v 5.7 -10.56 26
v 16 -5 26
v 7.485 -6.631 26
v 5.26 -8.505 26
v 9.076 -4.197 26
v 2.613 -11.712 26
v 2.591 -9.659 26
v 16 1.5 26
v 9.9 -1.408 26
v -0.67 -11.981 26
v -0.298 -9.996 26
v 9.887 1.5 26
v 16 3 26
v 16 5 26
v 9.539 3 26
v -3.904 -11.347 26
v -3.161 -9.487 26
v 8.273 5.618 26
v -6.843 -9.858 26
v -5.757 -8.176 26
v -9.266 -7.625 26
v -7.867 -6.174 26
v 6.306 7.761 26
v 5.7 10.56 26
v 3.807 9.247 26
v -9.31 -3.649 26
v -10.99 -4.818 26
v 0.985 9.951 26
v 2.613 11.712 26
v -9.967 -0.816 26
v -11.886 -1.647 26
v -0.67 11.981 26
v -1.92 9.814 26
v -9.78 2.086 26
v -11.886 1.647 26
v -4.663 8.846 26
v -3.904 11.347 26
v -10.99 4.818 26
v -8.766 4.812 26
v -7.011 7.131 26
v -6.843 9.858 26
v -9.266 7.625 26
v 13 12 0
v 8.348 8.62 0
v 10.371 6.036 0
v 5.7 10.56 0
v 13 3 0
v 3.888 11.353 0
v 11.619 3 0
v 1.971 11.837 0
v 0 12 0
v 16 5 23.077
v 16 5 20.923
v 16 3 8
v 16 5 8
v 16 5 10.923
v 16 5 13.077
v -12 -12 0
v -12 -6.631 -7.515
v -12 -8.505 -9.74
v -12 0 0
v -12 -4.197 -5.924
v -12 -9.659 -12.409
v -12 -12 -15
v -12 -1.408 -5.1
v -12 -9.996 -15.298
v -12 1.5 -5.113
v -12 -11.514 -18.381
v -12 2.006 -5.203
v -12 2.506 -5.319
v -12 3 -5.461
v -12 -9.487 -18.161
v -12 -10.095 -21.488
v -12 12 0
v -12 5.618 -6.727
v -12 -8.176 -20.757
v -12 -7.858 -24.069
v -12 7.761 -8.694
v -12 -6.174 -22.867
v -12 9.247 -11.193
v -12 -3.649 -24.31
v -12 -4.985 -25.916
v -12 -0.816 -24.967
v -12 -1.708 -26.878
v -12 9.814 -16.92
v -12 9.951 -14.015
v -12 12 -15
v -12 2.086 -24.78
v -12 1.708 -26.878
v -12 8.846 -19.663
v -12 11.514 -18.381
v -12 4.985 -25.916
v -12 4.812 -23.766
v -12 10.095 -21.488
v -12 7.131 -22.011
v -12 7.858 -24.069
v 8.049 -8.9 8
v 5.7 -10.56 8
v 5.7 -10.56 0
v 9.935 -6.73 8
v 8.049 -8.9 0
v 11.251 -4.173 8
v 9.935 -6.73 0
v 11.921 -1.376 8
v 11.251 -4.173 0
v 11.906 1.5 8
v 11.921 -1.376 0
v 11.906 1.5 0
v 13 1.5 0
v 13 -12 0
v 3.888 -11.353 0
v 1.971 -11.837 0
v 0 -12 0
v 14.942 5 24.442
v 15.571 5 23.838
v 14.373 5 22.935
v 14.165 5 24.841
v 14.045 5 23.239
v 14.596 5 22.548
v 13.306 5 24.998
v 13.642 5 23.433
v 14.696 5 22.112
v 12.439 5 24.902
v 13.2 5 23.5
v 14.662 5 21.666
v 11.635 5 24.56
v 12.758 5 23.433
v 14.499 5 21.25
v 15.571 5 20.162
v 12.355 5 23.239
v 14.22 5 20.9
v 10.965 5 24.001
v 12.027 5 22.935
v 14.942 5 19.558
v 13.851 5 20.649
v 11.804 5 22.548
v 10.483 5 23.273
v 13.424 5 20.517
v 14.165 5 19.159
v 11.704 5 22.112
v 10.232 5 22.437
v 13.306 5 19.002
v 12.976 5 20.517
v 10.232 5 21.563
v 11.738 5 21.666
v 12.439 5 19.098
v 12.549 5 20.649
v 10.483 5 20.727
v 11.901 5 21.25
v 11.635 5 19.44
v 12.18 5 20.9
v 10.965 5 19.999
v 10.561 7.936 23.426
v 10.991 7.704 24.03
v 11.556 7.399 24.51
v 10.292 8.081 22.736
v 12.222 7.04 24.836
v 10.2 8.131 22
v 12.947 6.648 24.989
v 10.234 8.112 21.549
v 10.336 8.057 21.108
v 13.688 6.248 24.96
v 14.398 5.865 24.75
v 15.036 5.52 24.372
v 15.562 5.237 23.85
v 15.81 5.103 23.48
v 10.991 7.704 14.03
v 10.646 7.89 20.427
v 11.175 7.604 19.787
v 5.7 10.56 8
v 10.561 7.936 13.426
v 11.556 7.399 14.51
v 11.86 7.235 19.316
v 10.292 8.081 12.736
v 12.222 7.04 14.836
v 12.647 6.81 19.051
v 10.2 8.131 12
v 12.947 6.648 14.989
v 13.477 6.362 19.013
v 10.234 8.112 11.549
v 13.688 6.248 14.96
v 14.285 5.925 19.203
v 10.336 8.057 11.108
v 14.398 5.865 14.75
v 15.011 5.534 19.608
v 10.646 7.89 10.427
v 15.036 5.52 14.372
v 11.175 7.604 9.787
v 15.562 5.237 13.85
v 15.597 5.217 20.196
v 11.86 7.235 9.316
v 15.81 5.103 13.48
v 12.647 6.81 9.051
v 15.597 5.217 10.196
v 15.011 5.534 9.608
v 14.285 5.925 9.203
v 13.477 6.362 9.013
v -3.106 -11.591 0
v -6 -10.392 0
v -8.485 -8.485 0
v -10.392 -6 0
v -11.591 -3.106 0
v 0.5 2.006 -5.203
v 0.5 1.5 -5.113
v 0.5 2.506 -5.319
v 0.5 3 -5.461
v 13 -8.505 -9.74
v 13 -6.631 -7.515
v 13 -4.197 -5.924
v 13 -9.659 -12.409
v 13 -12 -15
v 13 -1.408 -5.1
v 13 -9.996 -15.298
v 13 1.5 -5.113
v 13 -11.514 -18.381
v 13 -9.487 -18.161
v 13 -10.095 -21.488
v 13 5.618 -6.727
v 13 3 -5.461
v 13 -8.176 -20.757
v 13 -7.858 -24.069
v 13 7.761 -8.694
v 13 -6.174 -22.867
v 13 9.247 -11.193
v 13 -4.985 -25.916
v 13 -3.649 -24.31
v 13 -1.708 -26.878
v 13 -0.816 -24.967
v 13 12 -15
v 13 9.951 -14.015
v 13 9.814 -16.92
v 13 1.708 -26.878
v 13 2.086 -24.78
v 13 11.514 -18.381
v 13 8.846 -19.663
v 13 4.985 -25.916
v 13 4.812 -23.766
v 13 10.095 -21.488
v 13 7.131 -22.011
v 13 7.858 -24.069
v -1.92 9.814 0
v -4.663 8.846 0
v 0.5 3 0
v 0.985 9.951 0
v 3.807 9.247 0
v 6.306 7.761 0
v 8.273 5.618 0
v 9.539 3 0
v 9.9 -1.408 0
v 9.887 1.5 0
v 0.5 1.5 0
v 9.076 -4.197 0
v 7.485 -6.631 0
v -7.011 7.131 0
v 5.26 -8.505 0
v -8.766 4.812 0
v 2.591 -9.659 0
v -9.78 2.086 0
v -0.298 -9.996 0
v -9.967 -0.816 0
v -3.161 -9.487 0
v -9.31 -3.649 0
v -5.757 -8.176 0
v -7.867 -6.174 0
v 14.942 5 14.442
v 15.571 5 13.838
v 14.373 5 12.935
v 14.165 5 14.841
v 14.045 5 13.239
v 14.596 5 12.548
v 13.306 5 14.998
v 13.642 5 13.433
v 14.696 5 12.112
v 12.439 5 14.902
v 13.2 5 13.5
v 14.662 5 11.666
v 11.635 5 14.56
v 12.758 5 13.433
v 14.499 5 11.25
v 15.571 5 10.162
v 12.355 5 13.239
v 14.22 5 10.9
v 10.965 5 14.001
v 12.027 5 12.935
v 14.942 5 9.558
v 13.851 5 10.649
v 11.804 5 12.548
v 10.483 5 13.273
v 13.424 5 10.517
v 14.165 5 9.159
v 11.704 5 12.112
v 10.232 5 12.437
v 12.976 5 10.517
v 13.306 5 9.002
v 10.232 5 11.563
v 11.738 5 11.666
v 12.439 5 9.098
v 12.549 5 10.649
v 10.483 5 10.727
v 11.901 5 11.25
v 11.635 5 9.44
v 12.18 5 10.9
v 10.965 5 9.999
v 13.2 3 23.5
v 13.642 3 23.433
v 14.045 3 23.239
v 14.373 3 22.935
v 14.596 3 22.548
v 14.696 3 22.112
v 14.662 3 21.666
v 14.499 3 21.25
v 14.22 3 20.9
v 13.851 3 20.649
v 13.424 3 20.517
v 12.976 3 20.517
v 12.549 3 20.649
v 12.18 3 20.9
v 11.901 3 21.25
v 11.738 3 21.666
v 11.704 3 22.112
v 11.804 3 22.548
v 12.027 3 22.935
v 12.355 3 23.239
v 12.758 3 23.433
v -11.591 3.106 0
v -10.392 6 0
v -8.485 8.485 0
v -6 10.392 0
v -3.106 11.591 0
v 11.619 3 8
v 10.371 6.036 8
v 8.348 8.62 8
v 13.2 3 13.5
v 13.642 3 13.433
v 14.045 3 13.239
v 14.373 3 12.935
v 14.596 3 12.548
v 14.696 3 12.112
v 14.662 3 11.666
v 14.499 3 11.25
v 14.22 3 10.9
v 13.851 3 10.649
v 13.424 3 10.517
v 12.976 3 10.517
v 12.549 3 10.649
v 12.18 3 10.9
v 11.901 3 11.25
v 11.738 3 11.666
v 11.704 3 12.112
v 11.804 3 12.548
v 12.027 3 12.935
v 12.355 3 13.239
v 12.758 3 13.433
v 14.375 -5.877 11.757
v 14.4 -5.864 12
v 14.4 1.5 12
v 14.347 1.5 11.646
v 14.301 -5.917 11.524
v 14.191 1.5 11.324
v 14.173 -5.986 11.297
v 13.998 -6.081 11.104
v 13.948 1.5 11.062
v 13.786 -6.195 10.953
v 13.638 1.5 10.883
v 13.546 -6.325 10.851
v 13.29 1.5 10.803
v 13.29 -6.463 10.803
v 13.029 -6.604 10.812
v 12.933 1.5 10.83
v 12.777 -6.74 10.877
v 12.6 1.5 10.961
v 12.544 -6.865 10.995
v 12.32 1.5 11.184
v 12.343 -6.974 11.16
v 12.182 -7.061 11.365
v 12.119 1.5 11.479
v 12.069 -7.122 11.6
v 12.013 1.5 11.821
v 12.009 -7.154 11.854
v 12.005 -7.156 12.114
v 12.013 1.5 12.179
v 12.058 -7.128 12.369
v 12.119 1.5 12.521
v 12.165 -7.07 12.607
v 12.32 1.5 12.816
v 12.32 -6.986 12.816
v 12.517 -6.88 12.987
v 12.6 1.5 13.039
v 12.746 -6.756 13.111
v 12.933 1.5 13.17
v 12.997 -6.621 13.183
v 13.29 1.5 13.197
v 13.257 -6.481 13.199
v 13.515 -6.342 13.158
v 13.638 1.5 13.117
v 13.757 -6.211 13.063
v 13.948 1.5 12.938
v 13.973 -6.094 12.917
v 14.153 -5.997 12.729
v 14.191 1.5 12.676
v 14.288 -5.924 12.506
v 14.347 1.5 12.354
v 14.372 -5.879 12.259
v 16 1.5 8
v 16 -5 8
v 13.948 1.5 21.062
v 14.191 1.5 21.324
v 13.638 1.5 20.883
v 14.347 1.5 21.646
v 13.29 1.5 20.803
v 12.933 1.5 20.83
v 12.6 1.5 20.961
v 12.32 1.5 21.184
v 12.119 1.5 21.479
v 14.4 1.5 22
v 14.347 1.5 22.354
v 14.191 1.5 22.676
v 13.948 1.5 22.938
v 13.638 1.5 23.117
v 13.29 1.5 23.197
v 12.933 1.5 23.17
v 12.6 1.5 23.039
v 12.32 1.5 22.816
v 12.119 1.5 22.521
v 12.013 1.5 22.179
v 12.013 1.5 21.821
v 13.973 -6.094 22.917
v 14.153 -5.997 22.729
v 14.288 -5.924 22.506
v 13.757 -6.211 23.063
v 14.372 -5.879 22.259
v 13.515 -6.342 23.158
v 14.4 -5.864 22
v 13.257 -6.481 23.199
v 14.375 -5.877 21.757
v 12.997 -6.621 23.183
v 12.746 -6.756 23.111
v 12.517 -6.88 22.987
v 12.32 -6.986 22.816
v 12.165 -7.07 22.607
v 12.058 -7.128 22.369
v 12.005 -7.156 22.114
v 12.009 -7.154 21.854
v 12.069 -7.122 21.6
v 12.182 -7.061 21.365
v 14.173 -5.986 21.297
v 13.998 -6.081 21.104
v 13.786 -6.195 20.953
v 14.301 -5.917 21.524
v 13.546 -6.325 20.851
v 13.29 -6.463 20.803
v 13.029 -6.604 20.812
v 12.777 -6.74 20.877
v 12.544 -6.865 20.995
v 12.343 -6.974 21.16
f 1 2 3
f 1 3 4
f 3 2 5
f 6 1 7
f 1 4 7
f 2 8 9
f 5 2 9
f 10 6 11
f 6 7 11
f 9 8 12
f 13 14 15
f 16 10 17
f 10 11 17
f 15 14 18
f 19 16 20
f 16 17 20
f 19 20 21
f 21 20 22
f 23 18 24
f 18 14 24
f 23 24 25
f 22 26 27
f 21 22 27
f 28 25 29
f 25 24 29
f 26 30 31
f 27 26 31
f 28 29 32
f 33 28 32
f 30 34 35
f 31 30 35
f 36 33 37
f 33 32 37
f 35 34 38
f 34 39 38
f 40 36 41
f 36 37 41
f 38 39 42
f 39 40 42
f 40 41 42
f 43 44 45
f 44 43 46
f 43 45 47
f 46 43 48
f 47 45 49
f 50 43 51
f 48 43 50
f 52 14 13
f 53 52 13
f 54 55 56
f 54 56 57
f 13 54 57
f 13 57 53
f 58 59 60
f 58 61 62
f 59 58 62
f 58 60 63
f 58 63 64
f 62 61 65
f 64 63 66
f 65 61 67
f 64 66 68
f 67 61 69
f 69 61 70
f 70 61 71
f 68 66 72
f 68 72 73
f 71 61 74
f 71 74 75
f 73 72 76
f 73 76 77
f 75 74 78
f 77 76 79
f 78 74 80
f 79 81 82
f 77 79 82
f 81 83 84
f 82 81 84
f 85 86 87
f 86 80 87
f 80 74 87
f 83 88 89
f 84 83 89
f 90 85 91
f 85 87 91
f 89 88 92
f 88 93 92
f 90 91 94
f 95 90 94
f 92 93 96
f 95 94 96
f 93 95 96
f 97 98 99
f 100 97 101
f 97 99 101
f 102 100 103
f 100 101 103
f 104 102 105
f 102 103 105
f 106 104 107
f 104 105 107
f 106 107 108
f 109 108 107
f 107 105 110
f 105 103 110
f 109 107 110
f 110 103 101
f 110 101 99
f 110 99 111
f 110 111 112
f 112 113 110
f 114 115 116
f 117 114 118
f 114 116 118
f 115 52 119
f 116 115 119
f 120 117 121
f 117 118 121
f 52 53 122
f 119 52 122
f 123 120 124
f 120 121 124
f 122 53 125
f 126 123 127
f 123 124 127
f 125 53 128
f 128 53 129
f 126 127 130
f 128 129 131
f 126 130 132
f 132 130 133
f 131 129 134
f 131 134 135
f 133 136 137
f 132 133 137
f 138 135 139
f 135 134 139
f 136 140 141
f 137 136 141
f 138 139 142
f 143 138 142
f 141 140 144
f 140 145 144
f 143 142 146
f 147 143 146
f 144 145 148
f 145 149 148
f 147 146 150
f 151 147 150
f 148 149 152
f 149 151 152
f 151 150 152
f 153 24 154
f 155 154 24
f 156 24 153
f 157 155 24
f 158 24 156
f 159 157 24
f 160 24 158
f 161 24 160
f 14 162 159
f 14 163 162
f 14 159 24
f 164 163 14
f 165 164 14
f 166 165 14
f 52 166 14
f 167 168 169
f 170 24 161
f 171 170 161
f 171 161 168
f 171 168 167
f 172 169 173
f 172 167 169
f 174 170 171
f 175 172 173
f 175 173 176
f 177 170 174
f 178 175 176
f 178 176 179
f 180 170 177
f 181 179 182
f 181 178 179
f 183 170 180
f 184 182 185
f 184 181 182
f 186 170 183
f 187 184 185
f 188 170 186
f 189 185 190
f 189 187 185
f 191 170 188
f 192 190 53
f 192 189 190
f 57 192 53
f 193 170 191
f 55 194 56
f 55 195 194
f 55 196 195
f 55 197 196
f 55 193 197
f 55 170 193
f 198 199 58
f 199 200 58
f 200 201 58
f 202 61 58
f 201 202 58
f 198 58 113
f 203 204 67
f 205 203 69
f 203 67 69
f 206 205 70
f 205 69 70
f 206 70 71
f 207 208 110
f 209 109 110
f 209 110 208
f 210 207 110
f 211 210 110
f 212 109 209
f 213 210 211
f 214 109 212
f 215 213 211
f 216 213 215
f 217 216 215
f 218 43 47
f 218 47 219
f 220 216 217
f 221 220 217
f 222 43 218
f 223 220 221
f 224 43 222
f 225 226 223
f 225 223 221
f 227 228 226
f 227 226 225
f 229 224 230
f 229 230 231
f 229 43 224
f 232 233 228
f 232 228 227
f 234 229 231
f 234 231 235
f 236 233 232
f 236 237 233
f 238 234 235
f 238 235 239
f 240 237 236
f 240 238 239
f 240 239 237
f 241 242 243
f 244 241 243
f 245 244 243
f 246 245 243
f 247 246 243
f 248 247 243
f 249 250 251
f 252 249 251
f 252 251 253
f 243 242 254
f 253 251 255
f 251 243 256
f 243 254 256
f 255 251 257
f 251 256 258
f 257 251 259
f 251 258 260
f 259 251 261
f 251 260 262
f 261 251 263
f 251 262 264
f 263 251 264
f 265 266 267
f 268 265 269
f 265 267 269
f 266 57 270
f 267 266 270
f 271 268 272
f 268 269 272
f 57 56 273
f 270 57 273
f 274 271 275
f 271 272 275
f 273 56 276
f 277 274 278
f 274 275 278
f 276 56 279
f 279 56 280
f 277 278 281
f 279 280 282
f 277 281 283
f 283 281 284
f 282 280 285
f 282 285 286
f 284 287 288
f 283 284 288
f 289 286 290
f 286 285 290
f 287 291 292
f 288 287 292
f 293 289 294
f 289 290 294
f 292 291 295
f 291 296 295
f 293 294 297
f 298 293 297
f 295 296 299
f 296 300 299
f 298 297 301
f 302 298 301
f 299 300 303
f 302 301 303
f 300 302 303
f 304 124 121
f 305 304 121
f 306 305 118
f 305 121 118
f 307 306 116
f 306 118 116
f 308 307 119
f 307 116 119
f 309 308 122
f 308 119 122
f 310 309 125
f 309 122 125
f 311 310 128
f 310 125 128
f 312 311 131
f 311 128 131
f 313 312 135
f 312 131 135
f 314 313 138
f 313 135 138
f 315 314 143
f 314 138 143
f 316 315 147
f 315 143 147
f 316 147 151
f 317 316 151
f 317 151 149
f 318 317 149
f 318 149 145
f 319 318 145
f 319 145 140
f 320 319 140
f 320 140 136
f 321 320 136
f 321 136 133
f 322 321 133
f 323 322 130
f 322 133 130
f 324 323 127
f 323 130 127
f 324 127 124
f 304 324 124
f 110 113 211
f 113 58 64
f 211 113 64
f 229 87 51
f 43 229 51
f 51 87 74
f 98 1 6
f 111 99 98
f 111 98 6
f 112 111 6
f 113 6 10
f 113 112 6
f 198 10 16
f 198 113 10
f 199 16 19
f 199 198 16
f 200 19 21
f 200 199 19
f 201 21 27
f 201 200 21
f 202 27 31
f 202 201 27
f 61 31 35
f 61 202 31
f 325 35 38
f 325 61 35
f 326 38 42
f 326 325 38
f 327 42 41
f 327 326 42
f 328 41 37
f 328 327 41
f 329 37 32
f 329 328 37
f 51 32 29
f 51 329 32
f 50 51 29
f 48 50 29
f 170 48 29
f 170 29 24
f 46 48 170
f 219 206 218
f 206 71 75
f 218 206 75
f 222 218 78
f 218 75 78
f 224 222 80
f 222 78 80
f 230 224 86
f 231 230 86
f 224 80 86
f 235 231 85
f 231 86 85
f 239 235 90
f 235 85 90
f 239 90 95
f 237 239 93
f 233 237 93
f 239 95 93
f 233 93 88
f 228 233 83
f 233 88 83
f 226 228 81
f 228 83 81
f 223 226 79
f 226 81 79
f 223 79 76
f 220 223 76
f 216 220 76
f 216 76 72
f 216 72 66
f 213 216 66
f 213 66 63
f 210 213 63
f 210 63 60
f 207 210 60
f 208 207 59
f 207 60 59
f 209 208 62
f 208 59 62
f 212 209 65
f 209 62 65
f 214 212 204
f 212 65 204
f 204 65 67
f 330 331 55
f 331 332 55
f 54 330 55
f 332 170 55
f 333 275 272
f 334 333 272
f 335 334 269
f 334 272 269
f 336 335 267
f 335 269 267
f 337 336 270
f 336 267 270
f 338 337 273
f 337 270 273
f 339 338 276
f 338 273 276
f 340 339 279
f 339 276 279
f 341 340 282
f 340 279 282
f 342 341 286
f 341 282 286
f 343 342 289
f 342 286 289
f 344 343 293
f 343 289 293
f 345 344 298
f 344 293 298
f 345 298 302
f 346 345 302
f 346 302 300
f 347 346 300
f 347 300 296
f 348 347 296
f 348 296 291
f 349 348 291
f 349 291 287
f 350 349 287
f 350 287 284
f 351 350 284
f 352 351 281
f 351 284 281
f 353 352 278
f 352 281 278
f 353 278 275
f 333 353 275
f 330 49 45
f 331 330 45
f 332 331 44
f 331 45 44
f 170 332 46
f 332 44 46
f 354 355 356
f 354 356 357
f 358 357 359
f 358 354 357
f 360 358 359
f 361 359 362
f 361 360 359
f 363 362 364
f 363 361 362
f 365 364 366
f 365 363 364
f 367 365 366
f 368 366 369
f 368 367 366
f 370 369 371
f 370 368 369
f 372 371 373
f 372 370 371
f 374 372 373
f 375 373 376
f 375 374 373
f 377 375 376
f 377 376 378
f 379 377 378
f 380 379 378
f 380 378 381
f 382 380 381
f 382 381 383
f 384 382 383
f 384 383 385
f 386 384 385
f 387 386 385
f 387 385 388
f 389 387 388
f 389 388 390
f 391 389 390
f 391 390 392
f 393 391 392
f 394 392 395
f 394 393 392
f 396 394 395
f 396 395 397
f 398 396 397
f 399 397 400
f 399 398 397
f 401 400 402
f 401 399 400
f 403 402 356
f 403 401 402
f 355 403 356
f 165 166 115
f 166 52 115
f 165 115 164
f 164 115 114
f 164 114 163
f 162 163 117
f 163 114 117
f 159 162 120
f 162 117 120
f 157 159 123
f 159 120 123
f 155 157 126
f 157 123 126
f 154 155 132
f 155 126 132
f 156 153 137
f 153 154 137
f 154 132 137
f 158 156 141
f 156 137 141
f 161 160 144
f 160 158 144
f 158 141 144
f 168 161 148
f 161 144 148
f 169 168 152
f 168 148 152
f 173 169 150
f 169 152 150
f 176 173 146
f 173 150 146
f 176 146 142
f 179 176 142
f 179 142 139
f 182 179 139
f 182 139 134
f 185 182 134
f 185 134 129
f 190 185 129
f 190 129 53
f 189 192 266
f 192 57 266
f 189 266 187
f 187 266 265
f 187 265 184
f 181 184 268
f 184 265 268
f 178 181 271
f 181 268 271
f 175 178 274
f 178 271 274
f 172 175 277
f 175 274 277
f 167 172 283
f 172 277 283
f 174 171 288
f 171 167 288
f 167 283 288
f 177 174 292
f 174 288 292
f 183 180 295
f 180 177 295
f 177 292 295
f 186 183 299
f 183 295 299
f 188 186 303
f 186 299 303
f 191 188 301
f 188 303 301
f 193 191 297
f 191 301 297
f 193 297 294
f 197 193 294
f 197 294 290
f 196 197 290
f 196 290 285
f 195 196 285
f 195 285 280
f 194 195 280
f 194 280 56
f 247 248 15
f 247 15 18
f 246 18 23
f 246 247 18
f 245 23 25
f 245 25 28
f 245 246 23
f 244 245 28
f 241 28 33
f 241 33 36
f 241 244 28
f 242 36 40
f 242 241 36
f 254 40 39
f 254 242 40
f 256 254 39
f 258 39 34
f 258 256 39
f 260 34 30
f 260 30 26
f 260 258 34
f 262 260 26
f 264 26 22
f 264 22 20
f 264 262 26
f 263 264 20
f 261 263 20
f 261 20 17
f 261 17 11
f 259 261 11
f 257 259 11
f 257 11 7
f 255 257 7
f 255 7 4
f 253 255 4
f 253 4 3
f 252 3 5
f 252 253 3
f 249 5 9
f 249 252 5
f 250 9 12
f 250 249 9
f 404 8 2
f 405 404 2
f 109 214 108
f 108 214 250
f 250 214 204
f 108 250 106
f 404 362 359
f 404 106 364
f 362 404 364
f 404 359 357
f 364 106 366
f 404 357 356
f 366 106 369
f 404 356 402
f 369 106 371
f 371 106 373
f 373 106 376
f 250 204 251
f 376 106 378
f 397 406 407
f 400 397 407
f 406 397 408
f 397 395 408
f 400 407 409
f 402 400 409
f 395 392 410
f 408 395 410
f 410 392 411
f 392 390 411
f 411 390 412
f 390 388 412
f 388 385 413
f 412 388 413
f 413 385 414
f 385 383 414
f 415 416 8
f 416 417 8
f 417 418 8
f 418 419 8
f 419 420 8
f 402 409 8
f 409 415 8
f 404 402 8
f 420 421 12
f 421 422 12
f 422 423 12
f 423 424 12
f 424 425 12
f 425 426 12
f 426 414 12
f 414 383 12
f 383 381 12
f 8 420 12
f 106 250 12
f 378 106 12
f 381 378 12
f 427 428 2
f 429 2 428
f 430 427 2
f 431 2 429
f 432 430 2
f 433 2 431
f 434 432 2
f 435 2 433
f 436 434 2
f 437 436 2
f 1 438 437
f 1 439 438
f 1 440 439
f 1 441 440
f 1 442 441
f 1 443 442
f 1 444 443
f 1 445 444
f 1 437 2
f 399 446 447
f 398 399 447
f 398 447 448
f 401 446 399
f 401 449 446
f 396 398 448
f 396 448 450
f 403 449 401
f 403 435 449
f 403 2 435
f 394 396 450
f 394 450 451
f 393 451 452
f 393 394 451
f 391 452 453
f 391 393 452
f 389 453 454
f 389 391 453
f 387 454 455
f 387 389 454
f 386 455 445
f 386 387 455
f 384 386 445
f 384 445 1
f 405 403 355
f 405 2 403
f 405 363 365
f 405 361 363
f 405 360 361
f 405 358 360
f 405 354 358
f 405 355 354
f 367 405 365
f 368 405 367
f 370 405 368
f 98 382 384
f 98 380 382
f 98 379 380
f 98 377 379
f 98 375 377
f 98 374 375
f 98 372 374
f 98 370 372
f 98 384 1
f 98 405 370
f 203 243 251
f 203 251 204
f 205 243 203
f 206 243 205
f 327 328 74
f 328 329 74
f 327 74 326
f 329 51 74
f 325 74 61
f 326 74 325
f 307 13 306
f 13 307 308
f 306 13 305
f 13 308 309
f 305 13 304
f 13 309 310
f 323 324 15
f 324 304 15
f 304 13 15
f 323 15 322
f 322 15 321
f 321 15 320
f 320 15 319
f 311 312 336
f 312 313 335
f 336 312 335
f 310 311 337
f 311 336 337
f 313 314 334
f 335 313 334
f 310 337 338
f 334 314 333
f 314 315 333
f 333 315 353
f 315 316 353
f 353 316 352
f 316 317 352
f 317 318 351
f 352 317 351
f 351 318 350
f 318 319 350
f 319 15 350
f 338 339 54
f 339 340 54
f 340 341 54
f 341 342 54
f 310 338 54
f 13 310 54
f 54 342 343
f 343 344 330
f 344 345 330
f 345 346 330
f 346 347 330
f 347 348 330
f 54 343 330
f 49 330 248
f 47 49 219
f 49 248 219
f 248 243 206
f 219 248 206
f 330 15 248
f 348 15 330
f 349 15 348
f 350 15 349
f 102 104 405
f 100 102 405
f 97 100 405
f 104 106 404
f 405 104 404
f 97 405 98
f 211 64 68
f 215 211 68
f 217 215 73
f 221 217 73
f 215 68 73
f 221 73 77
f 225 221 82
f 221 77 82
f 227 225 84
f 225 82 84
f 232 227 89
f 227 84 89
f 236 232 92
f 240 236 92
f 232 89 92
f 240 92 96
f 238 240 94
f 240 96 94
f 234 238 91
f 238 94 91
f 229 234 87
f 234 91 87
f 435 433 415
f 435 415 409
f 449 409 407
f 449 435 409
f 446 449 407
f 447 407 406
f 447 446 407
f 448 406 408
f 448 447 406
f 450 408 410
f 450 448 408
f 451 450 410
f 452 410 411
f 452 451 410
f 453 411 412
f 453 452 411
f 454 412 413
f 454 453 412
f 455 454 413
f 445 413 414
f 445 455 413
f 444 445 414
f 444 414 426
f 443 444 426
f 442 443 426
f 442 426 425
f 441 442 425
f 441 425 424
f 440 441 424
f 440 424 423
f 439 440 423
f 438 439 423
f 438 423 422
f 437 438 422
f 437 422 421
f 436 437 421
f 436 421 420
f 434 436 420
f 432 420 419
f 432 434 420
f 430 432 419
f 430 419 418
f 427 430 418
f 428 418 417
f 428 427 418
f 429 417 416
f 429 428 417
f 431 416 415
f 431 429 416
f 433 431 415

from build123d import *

# Parameters (mm, degrees)
BOSS_EXTRU_1_DEPTH           = 26
BOSS_EXTRU_4_DEPTH           = 25
ESQUISSE5_R                  = 17.691806013
ESQUISSE5_R_2                = 12
ENL_V_MAT_EXTRU_2_DEPTH      = 8
ENL_V_START                  = -2
ESQUISSE6_R                  = 3
ENL_V_MAT_EXTRU_3_DEPTH      = 33.785054262
ESQUISSE7_R                  = 1.5
ENL_V_MAT_EXTRU_4_DEPTH      = 2
ENL_V_MAT_EXTRU_5_DEPTH      = 35.165040612
ENL_V_MAT_EXTRU_5_DEPTH_BACK = 35.165040612
ESQUISSE8_R                  = 1.2
ESQUISSE9_R                  = 10
BOSS_EXTRU_5_DEPTH           = 12.5


with BuildPart() as part:
    # Esquisse1 → Boss.-Extru.1 (new body)
    with BuildSketch(Plane.XY):
        with BuildLine():
            Line((5.700064076, 10.559794957), (16, 5))
            Line((16, 5), (16, 3))
            Line((16, 3), (9.539392014, 3))
            ThreePointArc((9.539392014, 3), (-9.742038622, -2.256697475), (9.886859967, 1.5))
            Line((9.886859967, 1.5), (16, 1.5))
            Line((16, 1.5), (16, -5))
            Line((16, -5), (5.700064076, -10.559794957))
            ThreePointArc((5.700064076, -10.559794957), (-12, 0), (5.700064076, 10.559794957))
        make_face()
    extrude(amount=BOSS_EXTRU_1_DEPTH)

    # Esquisse2 → Boss.-Extru.4 (add)
    with BuildSketch(Plane(origin=(-12, 0, 0), x_dir=(0, 0, -1), z_dir=(1, 0, 0))):
        with BuildLine():
            Line((0, -12), (15, -12))
            ThreePointArc((15, -12), (27, 0), (15, 12))
            Line((15, 12), (0, 12))
            Line((0, 12), (0, 3))
            Line((0, 3), (5.460607986, 3))
            ThreePointArc((5.460607986, 3), (24.742038622, -2.256697475), (5.113140033, 1.5))
            Line((5.113140033, 1.5), (0, 1.5))
            Line((0, 1.5), (0, -12))
        make_face()
    extrude(amount=BOSS_EXTRU_4_DEPTH)

    # Esquisse5 → Enlèv. mat.-Extru.2 (cut)
    with BuildSketch(Plane.XY):
        Circle(ESQUISSE5_R)
        Circle(ESQUISSE5_R_2, mode=Mode.SUBTRACT)
    extrude(amount=ENL_V_MAT_EXTRU_2_DEPTH, mode=Mode.SUBTRACT)

    # Esquisse6 → Enlèv. mat.-Extru.3 (cut, through all)
    with BuildSketch(Plane(origin=(0, 3, 0), x_dir=(-1, 0, 0), z_dir=(0, -1, 0)).offset(ENL_V_START)):
        with Locations((-13.2, -12)):
            Circle(ESQUISSE6_R)
        with Locations((-13.2, -22)):
            Circle(ESQUISSE6_R)
    extrude(amount=-ENL_V_MAT_EXTRU_3_DEPTH, mode=Mode.SUBTRACT)

    # Esquisse7 → Enlèv. mat.-Extru.4 (cut)
    with BuildSketch(Plane(origin=(0, 5, 0), x_dir=(1, 0, 0), z_dir=(0, 1, 0))):
        with Locations(Location((13.2, -12, 0), (0, 0, 270))):
            Circle(ESQUISSE7_R)
        with Locations(Location((13.2, -22, 0), (0, 0, 270))):
            Circle(ESQUISSE7_R)
    extrude(amount=-ENL_V_MAT_EXTRU_4_DEPTH, mode=Mode.SUBTRACT)

    # Esquisse8 → Enlèv. mat.-Extru.5 (cut, two sides: drawn at the far end of the back side and taken through both)
    with BuildSketch(Plane(origin=(0, 1.5, 0), x_dir=(1, 0, 0), z_dir=(0, 1, 0)).offset(-ENL_V_MAT_EXTRU_5_DEPTH_BACK)):
        with Locations((13.2, -12)):
            Circle(ESQUISSE8_R)
        with Locations((13.2, -22)):
            Circle(ESQUISSE8_R)
    extrude(amount=ENL_V_MAT_EXTRU_5_DEPTH + ENL_V_MAT_EXTRU_5_DEPTH_BACK, mode=Mode.SUBTRACT)

    # Esquisse9 → Boss.-Extru.5 (add)
    with BuildSketch(Plane.ZY.offset(12)):
        with BuildLine():
            Line((-15, 12), (0, 12))
            Line((0, 12), (0, -12))
            Line((0, -12), (-15, -12))
            ThreePointArc((-15, -12), (-27, 0), (-15, 12))
        make_face()
        with Locations((-15, 0)):
            Circle(ESQUISSE9_R, mode=Mode.SUBTRACT)
    extrude(amount=-BOSS_EXTRU_5_DEPTH)


solid = part.part
